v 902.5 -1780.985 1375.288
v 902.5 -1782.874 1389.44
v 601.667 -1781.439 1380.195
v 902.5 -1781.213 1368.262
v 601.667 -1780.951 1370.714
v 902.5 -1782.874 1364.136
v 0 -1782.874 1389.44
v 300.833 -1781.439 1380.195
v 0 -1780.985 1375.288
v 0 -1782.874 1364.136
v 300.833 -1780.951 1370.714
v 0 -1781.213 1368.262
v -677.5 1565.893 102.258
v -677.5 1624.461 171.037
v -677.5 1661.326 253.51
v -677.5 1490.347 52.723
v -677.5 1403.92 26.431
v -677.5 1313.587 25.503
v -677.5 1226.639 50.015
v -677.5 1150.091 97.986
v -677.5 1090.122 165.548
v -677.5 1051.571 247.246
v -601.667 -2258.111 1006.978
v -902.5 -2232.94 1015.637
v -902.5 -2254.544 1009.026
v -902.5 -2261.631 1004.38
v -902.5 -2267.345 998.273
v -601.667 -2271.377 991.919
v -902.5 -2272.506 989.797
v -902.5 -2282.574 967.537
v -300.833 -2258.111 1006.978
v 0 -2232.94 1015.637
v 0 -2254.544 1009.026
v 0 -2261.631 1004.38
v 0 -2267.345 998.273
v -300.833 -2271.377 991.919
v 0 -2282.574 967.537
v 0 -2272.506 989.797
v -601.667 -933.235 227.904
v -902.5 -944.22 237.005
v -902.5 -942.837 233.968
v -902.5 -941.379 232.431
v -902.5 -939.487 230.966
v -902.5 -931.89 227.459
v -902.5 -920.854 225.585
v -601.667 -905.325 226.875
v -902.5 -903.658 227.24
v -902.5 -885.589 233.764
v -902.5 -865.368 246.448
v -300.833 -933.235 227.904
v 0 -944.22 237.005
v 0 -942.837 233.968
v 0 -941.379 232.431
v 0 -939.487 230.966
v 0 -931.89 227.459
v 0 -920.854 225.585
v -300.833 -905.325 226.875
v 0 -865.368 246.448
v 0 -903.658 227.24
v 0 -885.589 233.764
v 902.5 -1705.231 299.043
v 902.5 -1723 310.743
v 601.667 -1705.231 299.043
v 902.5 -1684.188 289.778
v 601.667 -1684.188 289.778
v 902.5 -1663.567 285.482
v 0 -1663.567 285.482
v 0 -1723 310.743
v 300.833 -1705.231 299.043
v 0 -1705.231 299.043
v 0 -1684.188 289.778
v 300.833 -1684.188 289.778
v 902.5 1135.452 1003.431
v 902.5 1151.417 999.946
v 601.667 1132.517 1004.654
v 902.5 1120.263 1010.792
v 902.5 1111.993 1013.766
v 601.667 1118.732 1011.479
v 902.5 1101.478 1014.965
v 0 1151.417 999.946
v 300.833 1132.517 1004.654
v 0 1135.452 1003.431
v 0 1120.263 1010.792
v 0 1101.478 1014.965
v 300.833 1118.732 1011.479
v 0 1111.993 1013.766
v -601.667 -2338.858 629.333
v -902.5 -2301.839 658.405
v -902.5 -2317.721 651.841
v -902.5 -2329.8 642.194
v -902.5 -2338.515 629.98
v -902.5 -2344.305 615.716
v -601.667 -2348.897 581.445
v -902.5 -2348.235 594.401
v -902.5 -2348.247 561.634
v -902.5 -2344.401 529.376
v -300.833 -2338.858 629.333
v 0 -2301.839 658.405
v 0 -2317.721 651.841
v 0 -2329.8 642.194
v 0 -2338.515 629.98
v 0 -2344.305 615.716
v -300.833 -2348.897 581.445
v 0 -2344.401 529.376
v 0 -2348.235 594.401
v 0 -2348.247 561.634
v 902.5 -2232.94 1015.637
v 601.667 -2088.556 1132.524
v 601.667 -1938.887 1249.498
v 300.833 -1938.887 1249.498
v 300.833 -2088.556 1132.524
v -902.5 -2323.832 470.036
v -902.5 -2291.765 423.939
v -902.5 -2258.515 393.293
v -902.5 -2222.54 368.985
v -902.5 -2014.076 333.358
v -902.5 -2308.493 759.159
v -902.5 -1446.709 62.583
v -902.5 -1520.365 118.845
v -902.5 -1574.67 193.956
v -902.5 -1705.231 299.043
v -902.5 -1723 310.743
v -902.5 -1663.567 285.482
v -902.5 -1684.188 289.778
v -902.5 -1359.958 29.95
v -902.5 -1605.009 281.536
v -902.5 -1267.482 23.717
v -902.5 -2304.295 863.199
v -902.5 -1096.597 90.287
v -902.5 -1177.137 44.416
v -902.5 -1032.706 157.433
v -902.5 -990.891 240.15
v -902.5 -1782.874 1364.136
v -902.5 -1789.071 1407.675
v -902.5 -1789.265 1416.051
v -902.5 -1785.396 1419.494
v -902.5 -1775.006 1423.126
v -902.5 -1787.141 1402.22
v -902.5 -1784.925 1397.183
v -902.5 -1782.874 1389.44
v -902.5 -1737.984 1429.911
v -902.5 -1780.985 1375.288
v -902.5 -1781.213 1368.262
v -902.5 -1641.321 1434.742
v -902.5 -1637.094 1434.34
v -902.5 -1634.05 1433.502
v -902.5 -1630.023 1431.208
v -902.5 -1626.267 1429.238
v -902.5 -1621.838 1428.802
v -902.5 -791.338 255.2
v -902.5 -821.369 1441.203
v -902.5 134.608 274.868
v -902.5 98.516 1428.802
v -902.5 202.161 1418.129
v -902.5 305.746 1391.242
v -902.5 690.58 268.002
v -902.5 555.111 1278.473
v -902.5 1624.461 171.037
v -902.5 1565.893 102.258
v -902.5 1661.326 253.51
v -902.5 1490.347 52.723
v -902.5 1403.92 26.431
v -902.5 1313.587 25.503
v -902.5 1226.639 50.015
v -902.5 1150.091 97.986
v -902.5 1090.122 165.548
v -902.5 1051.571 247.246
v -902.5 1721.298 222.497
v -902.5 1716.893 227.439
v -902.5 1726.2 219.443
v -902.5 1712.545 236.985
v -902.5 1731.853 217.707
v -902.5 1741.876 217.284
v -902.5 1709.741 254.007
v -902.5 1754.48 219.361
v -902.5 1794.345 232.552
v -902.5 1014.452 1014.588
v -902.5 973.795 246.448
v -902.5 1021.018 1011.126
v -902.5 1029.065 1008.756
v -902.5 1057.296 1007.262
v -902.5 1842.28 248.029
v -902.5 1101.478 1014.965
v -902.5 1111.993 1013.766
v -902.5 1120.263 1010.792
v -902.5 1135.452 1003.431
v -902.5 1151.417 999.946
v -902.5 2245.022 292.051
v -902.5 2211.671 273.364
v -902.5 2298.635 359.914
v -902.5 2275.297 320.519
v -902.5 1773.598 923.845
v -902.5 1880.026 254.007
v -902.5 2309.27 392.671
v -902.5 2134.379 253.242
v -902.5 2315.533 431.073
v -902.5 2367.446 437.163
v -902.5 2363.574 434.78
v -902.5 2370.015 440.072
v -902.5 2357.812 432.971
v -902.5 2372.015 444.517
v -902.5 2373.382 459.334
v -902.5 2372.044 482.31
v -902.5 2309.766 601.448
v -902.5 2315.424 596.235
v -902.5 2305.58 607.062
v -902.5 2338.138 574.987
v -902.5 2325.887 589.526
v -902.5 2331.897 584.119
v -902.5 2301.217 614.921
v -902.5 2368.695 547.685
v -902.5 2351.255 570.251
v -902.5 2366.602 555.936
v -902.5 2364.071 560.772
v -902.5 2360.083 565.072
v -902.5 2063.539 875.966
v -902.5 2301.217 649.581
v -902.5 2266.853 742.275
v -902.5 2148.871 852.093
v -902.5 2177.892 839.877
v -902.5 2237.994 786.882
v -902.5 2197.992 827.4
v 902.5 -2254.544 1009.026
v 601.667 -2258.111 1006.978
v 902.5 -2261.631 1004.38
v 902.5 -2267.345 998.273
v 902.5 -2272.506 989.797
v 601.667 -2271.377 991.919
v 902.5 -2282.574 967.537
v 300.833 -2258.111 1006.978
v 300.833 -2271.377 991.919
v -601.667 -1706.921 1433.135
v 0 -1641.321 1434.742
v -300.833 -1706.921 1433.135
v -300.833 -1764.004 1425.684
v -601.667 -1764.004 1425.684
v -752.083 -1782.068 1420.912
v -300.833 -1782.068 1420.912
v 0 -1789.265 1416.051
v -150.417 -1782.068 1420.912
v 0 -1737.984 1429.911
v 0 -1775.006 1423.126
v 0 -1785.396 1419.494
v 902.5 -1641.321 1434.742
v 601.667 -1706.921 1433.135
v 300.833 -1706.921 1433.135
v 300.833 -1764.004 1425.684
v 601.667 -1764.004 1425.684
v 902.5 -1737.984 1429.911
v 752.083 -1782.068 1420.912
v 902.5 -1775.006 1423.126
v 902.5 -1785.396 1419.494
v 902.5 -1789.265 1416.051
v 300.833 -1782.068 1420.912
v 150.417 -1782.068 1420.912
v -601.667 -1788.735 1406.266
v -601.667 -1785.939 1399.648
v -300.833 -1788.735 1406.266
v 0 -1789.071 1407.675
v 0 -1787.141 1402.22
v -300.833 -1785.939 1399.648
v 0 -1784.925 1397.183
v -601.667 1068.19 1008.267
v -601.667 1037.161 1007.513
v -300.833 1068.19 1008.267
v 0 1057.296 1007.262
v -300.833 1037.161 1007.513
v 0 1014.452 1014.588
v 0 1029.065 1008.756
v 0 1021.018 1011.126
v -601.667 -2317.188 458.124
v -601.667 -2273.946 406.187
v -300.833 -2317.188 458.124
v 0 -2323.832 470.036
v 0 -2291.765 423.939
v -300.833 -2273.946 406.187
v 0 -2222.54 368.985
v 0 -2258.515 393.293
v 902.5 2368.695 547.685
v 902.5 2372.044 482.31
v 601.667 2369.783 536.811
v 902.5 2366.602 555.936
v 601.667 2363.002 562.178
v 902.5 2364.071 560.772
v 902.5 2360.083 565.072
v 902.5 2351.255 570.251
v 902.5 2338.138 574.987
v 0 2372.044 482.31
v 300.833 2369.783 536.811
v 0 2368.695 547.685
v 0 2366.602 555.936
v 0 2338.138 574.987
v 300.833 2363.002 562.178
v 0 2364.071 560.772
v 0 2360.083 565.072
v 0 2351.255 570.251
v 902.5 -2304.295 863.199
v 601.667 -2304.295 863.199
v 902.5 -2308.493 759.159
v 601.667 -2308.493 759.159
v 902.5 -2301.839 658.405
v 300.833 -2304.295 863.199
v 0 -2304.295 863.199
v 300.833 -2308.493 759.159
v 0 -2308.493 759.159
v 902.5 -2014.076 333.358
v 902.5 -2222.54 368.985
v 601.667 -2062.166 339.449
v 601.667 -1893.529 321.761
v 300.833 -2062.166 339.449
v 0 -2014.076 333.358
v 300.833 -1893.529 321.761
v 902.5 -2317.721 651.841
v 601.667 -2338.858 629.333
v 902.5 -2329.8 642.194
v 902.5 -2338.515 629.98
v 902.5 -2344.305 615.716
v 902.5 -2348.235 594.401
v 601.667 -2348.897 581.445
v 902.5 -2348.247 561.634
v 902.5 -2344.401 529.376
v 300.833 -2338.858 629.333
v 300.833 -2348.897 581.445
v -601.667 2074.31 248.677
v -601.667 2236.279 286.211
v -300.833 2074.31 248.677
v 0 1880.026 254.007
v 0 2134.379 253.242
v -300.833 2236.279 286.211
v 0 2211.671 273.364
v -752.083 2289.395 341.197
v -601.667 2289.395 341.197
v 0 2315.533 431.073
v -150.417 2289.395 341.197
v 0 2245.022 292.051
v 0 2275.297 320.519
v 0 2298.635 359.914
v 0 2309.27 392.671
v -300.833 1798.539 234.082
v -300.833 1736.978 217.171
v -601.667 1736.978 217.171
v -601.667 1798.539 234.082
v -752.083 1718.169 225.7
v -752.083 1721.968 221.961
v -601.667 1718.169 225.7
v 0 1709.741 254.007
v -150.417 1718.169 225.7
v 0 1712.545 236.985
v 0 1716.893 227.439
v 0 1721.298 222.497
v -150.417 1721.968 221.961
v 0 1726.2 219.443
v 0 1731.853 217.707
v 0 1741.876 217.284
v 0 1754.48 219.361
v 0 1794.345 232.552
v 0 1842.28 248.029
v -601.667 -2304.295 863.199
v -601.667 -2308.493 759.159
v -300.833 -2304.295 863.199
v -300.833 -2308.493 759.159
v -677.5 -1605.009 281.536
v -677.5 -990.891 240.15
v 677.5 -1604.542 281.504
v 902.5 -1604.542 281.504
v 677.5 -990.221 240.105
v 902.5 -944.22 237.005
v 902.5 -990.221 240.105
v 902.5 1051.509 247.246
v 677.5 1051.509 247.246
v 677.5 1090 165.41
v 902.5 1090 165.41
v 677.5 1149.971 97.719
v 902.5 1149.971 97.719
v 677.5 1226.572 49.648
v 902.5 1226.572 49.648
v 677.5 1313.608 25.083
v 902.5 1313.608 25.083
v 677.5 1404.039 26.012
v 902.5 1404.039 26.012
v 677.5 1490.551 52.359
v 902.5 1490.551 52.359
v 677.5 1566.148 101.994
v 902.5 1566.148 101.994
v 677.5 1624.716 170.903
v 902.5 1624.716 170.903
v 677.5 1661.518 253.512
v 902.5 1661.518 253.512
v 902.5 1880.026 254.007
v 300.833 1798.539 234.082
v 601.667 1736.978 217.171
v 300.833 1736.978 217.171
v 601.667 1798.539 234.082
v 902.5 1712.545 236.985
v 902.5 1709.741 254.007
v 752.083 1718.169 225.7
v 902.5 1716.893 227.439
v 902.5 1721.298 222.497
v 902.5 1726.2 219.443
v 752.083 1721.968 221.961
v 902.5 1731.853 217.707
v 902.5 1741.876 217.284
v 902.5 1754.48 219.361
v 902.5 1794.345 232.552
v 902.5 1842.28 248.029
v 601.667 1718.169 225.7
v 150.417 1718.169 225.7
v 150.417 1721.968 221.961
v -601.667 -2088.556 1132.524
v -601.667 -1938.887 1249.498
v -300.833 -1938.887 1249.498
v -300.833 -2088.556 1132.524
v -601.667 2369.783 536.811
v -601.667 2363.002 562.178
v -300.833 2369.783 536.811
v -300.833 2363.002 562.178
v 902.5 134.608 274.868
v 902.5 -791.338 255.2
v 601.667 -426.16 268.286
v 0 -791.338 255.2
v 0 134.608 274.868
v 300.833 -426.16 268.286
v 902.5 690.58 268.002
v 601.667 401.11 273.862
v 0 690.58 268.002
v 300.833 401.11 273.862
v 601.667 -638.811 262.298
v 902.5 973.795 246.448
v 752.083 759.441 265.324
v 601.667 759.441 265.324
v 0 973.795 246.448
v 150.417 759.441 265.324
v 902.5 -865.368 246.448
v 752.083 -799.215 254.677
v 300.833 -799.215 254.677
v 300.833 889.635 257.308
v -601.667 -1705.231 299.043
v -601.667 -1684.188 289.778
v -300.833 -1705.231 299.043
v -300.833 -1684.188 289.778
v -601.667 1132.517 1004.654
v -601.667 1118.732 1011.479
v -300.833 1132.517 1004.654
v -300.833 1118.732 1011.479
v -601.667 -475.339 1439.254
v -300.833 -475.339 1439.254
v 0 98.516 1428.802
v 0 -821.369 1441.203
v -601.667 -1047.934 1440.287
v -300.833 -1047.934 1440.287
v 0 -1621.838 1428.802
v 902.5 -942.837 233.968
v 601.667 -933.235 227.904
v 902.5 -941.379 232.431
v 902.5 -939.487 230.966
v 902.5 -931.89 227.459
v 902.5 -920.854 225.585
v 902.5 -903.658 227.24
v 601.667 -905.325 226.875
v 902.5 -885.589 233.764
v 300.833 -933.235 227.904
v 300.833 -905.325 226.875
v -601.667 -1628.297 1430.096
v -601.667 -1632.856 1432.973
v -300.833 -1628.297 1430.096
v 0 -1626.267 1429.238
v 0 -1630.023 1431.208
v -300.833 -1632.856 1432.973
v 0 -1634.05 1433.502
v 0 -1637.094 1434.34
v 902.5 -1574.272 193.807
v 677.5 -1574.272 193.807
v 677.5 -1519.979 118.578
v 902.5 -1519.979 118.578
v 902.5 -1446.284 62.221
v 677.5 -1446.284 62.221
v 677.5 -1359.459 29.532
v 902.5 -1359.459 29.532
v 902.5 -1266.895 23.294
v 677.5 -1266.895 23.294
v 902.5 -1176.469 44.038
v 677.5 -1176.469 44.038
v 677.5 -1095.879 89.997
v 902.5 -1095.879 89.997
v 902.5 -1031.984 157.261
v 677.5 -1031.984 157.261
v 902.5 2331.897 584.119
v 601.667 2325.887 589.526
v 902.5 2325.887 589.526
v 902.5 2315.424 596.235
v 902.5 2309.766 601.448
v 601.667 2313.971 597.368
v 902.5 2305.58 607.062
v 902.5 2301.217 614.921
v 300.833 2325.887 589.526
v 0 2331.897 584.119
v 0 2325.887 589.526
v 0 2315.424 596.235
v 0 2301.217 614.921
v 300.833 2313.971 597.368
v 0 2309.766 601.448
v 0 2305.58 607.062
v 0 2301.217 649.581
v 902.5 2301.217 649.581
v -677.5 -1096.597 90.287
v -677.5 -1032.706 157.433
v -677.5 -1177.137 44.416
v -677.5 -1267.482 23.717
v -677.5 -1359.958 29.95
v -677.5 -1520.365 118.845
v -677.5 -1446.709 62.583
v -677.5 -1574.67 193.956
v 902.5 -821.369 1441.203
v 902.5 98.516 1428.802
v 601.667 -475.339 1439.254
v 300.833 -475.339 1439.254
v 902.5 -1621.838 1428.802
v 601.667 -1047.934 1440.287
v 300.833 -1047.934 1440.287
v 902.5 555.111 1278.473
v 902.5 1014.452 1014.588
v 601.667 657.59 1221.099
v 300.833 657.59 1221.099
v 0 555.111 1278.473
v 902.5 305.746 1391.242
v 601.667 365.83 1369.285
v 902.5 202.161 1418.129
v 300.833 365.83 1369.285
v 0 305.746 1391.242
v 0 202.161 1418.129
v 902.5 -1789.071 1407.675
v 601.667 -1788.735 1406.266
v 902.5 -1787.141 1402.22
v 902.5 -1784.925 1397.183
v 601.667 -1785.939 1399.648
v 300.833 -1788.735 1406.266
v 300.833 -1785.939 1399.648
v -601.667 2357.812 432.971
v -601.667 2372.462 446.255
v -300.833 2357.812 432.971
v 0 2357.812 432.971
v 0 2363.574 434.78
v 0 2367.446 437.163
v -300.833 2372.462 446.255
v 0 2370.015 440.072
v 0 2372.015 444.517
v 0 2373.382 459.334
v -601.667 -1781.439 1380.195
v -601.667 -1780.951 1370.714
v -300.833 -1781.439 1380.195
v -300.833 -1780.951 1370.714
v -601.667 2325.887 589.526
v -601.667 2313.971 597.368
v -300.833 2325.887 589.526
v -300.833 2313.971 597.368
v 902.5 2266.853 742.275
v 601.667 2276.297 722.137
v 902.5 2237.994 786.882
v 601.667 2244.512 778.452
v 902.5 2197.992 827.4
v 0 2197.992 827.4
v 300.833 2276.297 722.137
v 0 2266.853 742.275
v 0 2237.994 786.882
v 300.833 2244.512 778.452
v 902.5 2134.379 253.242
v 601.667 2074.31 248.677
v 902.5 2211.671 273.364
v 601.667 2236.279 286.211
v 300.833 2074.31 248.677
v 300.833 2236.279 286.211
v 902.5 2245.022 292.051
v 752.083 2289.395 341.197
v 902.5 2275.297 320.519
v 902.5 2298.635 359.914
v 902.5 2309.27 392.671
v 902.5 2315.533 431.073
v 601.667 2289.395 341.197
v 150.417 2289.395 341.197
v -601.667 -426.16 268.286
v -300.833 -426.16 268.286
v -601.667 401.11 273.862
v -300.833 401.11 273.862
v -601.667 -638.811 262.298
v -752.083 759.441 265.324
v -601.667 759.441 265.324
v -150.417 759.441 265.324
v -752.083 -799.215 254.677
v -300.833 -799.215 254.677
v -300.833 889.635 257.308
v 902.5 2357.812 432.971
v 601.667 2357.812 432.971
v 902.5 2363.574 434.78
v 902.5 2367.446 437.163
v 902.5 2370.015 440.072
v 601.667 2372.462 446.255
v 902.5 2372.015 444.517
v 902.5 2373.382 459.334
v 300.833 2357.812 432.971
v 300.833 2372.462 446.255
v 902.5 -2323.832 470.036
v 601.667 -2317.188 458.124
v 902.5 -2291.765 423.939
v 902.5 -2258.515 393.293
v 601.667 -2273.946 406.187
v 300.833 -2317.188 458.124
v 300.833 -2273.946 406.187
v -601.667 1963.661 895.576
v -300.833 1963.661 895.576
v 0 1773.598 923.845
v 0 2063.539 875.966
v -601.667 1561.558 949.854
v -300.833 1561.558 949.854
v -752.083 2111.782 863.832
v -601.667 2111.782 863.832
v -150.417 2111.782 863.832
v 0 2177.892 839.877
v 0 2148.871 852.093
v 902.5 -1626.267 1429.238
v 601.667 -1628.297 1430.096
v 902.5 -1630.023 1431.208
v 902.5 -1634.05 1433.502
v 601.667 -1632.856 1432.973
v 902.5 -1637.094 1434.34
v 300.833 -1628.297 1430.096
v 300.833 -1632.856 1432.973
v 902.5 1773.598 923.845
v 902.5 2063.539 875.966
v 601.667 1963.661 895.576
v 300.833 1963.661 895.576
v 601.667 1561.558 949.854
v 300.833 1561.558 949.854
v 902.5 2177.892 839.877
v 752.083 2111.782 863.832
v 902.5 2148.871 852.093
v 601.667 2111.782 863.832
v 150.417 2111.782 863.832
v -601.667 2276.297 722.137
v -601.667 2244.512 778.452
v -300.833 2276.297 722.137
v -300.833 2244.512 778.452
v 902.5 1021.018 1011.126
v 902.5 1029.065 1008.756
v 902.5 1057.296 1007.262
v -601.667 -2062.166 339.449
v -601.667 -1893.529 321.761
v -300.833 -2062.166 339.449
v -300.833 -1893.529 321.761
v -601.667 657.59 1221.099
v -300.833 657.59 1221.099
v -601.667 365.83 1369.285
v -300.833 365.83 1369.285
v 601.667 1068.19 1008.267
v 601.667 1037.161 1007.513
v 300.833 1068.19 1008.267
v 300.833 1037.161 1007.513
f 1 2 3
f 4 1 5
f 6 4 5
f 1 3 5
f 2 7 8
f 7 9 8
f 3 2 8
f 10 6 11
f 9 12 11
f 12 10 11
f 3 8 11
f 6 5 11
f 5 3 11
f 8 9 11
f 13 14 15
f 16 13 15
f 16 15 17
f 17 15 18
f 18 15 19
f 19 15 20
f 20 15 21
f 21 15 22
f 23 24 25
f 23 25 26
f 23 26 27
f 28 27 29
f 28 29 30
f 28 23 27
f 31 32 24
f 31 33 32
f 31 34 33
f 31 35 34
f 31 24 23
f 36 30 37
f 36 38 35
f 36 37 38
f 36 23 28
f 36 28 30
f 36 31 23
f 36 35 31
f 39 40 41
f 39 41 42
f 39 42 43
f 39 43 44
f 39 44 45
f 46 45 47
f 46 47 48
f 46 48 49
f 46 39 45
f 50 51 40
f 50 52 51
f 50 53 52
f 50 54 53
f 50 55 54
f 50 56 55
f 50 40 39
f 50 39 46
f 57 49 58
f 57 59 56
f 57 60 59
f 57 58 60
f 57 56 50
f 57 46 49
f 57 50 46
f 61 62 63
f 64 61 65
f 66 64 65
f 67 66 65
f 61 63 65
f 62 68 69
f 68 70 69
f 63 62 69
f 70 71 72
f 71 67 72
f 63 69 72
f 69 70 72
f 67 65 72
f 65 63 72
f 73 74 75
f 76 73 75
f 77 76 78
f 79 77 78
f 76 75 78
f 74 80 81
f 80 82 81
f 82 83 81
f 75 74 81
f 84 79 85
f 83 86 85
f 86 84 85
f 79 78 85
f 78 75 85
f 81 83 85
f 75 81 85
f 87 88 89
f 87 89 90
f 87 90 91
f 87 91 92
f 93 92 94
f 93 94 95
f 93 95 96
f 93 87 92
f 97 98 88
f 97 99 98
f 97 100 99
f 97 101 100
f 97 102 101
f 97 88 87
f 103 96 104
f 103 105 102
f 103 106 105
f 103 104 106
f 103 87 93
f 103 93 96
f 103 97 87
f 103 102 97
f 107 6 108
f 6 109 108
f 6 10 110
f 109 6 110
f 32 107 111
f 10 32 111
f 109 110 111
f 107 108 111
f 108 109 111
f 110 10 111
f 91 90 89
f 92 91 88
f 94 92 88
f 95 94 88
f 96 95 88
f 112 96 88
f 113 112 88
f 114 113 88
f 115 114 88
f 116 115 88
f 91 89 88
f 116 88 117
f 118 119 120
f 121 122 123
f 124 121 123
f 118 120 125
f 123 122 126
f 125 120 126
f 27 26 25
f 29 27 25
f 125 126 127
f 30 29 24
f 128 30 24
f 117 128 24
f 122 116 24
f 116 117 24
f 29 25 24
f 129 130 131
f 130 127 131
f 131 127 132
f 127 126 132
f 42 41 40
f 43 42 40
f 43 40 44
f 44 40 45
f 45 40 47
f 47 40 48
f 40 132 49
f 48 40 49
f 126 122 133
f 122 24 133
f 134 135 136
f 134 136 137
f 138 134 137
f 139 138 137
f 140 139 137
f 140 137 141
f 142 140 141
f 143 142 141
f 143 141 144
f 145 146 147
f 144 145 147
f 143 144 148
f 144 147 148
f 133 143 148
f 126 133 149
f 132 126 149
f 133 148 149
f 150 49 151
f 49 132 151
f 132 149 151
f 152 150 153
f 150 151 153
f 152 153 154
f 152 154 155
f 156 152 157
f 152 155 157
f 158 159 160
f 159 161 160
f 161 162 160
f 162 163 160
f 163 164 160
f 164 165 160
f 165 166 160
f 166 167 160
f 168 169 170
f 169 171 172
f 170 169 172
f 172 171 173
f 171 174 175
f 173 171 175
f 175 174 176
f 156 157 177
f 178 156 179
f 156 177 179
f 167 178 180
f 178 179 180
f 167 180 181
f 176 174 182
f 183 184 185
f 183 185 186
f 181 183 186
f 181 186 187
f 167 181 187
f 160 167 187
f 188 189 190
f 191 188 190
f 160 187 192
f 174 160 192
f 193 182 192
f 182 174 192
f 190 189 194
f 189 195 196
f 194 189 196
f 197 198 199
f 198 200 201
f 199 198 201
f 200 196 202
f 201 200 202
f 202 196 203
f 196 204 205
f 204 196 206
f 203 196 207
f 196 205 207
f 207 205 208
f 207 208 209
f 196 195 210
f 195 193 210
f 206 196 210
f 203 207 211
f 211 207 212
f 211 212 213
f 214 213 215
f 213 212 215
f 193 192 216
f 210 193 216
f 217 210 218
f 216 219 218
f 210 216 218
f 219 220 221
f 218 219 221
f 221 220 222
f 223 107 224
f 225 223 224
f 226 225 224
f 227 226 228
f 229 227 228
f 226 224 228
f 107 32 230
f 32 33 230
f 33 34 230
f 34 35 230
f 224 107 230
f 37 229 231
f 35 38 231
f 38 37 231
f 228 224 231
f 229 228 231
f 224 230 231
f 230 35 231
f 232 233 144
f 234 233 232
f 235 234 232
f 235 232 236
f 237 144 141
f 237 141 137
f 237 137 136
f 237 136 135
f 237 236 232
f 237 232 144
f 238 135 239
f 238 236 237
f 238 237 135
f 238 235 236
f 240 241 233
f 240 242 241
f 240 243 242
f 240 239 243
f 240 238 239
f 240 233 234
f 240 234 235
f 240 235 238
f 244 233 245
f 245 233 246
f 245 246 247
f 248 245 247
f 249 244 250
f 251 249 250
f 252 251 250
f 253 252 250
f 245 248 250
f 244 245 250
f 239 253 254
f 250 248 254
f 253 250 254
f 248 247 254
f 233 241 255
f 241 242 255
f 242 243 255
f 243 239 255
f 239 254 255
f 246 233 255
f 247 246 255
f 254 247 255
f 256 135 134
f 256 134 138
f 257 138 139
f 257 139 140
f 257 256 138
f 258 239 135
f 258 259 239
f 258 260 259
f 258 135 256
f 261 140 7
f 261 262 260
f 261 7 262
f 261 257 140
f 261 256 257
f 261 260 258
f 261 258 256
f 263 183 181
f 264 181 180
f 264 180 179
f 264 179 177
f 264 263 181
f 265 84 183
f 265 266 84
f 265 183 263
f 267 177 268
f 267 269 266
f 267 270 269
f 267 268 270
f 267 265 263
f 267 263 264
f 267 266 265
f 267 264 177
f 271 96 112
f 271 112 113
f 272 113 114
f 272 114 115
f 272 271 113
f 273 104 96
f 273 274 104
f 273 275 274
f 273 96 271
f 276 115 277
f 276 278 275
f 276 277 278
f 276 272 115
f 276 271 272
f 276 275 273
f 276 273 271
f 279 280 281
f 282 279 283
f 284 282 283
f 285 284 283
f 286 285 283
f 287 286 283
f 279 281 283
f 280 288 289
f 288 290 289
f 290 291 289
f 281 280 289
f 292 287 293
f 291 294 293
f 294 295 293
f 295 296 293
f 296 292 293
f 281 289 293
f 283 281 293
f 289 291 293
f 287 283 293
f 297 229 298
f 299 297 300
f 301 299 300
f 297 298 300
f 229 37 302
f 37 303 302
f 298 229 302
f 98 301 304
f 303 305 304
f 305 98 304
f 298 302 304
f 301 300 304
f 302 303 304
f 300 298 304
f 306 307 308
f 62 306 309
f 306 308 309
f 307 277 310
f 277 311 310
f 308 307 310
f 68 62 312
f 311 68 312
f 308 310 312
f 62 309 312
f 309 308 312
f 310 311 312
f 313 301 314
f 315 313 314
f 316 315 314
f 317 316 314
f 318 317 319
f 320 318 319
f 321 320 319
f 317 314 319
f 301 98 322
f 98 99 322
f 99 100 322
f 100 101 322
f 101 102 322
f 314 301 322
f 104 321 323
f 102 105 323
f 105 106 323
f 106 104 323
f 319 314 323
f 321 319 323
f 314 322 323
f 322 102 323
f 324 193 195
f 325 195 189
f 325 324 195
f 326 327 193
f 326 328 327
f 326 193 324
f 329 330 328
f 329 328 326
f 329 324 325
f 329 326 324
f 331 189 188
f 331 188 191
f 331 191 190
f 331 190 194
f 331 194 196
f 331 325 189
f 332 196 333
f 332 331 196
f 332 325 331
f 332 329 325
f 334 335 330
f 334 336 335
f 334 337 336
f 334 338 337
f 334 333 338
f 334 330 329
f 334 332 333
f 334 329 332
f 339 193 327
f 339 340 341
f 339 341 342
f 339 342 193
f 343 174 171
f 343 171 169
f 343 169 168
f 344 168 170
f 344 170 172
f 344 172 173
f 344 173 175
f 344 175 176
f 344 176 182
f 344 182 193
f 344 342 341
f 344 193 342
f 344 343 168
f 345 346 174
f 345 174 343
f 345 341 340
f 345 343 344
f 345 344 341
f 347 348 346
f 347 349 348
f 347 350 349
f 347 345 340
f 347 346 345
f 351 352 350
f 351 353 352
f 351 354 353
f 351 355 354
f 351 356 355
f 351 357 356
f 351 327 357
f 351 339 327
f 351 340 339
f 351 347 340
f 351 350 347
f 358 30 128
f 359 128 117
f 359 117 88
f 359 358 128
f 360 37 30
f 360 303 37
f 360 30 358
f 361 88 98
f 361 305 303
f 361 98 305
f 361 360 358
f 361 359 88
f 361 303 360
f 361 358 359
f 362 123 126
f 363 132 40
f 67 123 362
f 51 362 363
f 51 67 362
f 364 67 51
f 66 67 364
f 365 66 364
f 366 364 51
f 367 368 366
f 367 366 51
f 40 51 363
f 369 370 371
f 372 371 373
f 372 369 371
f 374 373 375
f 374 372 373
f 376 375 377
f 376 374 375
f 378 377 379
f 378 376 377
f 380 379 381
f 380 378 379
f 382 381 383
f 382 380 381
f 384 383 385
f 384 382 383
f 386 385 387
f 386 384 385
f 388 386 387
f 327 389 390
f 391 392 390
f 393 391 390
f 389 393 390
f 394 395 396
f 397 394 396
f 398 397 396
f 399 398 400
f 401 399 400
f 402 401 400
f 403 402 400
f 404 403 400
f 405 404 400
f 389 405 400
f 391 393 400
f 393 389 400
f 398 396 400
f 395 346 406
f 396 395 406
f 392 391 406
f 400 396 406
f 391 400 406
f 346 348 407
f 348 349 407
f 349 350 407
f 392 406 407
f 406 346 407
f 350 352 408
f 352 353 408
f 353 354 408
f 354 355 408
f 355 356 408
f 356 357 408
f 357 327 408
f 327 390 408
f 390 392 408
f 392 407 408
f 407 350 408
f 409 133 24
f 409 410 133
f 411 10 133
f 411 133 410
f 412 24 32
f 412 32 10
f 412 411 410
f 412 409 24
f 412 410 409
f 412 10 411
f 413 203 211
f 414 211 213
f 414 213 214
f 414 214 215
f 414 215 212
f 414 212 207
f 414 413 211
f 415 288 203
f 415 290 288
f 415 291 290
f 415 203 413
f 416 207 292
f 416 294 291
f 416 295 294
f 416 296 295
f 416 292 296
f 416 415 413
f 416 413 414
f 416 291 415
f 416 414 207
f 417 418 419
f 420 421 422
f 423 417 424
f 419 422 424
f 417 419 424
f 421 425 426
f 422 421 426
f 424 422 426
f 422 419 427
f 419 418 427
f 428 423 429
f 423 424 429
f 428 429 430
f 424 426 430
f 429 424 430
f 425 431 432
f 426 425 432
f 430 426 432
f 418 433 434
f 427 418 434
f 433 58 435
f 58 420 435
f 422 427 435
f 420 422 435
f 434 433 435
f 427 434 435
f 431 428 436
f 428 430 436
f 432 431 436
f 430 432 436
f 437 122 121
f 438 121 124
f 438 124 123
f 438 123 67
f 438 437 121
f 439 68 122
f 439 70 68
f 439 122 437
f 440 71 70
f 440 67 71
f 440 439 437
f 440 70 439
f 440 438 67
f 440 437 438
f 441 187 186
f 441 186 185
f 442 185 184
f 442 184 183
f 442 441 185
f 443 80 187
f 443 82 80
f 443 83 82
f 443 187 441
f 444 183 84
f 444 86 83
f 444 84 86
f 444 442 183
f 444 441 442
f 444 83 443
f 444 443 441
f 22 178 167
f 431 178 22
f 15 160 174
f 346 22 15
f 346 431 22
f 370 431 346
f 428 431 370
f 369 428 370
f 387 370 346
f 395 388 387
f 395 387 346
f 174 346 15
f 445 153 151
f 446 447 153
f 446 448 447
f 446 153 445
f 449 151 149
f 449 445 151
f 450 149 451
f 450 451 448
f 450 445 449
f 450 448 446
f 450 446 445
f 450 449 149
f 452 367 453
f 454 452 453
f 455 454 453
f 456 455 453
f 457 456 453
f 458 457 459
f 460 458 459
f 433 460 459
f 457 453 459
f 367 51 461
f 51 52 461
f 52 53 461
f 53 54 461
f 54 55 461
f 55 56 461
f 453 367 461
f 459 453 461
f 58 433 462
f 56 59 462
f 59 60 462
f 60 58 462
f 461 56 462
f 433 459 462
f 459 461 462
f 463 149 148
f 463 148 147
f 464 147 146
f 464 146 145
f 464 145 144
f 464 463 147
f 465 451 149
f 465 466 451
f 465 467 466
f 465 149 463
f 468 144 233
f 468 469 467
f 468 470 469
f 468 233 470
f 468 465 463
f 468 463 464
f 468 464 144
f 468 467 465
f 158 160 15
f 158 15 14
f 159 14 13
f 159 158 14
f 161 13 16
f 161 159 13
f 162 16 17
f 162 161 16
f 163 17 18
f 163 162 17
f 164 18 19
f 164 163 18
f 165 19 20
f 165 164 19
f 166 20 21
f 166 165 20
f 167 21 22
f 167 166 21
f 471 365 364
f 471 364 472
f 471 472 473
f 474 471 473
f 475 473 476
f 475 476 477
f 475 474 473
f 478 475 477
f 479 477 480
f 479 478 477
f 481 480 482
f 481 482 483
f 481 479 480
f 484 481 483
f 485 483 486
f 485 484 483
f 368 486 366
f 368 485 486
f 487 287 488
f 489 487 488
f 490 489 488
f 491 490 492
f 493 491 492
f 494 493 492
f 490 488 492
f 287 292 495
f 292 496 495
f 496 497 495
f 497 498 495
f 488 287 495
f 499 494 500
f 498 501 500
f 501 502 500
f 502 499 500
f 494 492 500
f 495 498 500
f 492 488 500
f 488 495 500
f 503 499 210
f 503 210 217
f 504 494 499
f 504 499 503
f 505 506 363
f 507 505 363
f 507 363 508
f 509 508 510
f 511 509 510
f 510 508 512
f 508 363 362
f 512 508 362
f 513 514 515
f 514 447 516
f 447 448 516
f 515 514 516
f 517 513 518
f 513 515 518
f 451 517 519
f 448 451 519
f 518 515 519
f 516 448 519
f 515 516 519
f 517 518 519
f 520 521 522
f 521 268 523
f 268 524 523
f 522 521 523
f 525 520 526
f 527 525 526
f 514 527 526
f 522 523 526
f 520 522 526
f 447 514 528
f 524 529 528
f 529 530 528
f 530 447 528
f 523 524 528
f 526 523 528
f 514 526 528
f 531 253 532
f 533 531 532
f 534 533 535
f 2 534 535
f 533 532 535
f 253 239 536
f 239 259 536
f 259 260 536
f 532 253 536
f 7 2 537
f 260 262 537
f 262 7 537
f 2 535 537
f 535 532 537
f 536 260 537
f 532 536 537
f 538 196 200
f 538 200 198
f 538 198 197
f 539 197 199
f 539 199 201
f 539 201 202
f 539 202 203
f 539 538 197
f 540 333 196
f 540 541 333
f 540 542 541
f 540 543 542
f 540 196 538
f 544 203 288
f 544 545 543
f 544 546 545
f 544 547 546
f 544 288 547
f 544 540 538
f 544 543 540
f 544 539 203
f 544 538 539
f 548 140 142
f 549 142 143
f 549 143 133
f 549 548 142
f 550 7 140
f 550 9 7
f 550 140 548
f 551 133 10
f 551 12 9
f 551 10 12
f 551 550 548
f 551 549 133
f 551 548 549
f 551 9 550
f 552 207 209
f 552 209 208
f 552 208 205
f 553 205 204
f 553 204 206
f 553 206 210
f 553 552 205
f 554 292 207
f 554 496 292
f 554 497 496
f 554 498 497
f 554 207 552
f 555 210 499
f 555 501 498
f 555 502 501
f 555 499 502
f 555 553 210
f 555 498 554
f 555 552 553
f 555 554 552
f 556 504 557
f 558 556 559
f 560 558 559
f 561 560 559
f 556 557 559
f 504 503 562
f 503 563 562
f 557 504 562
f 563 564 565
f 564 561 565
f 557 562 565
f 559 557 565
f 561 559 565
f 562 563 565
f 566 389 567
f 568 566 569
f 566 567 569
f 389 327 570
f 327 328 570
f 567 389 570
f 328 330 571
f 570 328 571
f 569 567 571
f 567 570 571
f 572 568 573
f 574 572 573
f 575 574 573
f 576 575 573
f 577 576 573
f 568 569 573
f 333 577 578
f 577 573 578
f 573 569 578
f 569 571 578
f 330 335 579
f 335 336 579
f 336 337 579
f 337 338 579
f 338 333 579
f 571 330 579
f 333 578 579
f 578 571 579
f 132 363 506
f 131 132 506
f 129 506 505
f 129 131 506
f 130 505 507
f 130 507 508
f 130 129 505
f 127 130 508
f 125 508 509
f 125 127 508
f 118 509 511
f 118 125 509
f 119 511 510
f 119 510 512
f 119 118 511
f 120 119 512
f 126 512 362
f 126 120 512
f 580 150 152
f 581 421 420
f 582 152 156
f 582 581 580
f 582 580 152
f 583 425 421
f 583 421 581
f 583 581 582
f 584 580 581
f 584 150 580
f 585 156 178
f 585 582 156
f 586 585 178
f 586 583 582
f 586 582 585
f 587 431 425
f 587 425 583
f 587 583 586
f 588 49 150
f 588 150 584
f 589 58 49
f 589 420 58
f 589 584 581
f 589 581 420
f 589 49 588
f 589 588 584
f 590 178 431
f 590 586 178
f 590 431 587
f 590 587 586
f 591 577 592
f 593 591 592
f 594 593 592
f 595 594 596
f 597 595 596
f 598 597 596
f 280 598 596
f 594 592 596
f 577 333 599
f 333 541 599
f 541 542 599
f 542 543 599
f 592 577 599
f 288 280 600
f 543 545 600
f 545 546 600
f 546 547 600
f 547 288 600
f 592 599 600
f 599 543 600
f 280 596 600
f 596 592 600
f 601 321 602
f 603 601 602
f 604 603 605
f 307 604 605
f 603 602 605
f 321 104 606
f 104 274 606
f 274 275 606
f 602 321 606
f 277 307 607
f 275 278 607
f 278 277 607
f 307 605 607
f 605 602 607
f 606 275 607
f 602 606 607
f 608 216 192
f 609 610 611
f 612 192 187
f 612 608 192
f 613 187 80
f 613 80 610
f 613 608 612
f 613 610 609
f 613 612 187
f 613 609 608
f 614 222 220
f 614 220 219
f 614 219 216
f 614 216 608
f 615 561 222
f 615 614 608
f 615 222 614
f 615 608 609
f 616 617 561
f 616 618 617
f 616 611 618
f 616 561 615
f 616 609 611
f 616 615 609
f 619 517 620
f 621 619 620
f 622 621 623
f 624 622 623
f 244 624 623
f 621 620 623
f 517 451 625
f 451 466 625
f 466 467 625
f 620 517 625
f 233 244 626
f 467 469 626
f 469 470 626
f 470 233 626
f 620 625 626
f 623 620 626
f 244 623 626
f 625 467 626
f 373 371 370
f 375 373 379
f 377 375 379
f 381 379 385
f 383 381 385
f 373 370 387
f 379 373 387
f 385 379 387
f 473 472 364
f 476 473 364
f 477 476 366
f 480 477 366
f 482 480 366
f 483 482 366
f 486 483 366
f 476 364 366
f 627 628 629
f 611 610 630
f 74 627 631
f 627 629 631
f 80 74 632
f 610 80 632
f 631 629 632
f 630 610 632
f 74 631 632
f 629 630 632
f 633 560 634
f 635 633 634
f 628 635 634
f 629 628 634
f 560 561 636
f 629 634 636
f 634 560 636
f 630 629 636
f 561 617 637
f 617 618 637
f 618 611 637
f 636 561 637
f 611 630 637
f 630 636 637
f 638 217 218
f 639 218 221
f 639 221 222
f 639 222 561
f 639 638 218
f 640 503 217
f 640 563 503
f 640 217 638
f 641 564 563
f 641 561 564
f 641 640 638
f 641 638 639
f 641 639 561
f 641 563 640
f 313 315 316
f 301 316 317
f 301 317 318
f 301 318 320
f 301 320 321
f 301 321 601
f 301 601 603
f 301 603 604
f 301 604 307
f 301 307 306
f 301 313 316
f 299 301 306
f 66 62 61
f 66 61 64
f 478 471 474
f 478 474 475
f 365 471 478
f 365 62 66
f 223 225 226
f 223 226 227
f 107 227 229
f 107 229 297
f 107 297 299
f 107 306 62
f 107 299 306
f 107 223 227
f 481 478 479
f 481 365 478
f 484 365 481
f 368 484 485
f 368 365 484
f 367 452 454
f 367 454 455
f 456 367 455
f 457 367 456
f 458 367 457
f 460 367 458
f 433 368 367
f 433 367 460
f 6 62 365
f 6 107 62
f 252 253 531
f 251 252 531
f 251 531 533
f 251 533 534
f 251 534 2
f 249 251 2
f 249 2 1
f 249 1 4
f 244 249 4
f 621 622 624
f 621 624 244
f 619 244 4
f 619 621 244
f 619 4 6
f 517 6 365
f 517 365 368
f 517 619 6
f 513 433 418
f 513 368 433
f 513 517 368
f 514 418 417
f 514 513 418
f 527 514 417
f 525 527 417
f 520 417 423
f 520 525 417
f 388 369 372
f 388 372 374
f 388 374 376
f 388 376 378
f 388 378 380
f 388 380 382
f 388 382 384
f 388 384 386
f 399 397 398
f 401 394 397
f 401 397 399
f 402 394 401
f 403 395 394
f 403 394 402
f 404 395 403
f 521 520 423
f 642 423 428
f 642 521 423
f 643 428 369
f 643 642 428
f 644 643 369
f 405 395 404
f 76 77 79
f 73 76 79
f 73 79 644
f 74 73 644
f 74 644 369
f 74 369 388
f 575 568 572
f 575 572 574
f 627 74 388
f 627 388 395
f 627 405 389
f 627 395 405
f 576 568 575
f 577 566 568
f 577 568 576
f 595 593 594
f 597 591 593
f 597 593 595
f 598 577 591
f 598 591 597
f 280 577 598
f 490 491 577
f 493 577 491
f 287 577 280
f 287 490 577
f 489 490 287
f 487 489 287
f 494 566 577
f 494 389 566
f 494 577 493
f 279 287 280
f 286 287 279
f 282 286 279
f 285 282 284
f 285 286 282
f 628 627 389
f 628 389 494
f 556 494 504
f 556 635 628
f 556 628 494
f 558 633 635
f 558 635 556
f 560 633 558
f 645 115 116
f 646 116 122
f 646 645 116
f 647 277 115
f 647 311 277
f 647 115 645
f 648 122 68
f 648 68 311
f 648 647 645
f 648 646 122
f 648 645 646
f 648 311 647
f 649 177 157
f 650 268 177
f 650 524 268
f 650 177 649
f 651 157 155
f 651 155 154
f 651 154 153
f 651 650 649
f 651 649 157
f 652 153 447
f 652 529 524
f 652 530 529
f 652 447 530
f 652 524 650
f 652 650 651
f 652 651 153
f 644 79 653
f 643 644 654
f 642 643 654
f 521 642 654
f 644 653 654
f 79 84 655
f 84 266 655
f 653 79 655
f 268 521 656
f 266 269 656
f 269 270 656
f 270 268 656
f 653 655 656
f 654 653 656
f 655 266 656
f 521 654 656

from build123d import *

# Parameters (mm, degrees)
F1_DEPTH = 902.5
F3_DEPTH = 225
F5_DEPTH = 225


with BuildPart() as f1:
    # F0 (on Right) → F1 (new body, symmetric)
    with BuildSketch(Plane.YZ):
        with BuildLine():
            add(Edge.make_bspline(
                [(1101.478338, 1014.964938), (1069.079041, 1005.923271), (1030.981779, 1002.969623), (1014.452219, 1014.588237)],
                knots=[0, 0, 0, 0, 87.026935, 87.026935, 87.026935, 87.026935], degree=3))
            add(Edge.make_bspline(
                [(1014.452219, 1014.588237), (611.487091, 1240.147233), (367.158981, 1423.733741), (98.51558, 1428.802401)],
                knots=[0, 0, 0, 0, 1005.242907, 1005.242907, 1005.242907, 1005.242907], degree=3))
            add(Edge.make_bspline(
                [(98.51558, 1428.802401), (-476.824492, 1442.931395), (-1046.424493, 1447.578598), (-1621.837849, 1428.802401)],
                knots=[0, 0, 0, 0, 1720.353428, 1720.353428, 1720.353428, 1720.353428], degree=3))
            add(Edge.make_bspline(
                [(-1621.837849, 1428.802401), (-1631.183743, 1428.406358), (-1628.966093, 1434.425473), (-1641.321182, 1434.742212)],
                knots=[0, 0, 0, 0, 20.368644, 20.368644, 20.368644, 20.368644], degree=3))
            add(Edge.make_bspline(
                [(-1641.321182, 1434.742212), (-1703.413248, 1437.276602), (-1787.681103, 1425.555229), (-1789.265156, 1416.051269)],
                knots=[0, 0, 0, 0, 149.119988, 149.119988, 149.119988, 149.119988], degree=3))
            add(Edge.make_bspline(
                [(-1789.265156, 1416.051269), (-1790.532351, 1402.428985), (-1785.408854, 1403.696299), (-1782.874465, 1389.440417)],
                knots=[0, 0, 0, 0, 27.367469, 27.367469, 27.367469, 27.367469], degree=3))
            add(Edge.make_bspline(
                [(-1782.874465, 1389.440417), (-1781.454563, 1381.36065), (-1779.255867, 1368.214488), (-1782.874465, 1364.135981)],
                knots=[0, 0, 0, 0, 25.304437, 25.304437, 25.304437, 25.304437], degree=3))
            add(Edge.make_bspline(
                [(-1782.874465, 1364.135981), (-1942.411184, 1251.474142), (-2090.845346, 1131.671906), (-2232.93972, 1015.63704)],
                knots=[0, 0, 0, 0, 569.218978, 569.218978, 569.218978, 569.218978], degree=3))
            add(Edge.make_bspline(
                [(-2232.93972, 1015.63704), (-2267.341375, 1009.202838), (-2269.133568, 997.554421), (-2282.573938, 967.537224)],
                knots=[0, 0, 0, 0, 69.116915, 69.116915, 69.116915, 69.116915], degree=3))
            add(Edge.make_bspline(
                [(-2282.573938, 967.537224), (-2315.279484, 864.045084), (-2311.695337, 756.520808), (-2301.838875, 658.404887)],
                knots=[0, 0, 0, 0, 309.732045, 309.732045, 309.732045, 309.732045], degree=3))
            add(Edge.make_bspline(
                [(-2301.838875, 658.404887), (-2356.497049, 643.620253), (-2352.016926, 578.657687), (-2344.400644, 529.375732)],
                knots=[0, 0, 0, 0, 135.867682, 135.867682, 135.867682, 135.867682], degree=3))
            add(Edge.make_bspline(
                [(-2344.400644, 529.375732), (-2327.823877, 446.940452), (-2275.405645, 400.346547), (-2222.539663, 368.985325)],
                knots=[0, 0, 0, 0, 201.432821, 201.432821, 201.432821, 201.432821], degree=3))
            add(Edge.make_bspline(
                [(-2222.539663, 368.985325), (-2068.421602, 331.799835), (-1892.350554, 320.151389), (-1722.999811, 310.743004)],
                knots=[0, 0, 0, 0, 502.923684, 502.923684, 502.923684, 502.923684], degree=3))
            add(Edge.make_bspline(
                [(-1722.999811, 310.743004), (-1708.100813, 298.669668), (-1682.744431, 286.449044), (-1663.56729, 285.481846)],
                knots=[0, 0, 0, 0, 48.861796, 48.861796, 48.861796, 48.861796], degree=3))
            add(Edge.make_bspline(
                [(-1663.56729, 285.481846), (-1649.298017, 284.762176), (-1638.449888, 290.272975), (-1637.876511, 306.710869)],
                knots=[48.861796, 48.861796, 48.861796, 48.861796, 85.218744, 85.218744, 85.218744, 85.218744], degree=3))
            add(Edge.make_bspline(
                [(-1637.876511, 306.710869), (-1649.076819, 526.687622), (-1542.44864, 647.204399), (-1412.971497, 702.75861)],
                knots=[0, 0, 0, 0, 455.451511, 455.451511, 455.451511, 455.451511], degree=3))
            add(Edge.make_bspline(
                [(-1412.971497, 702.75861), (-1258.853316, 737.704039), (-1082.334399, 719.783306), (-989.14665, 553.568661)],
                knots=[0, 0, 0, 0, 449.316305, 449.316305, 449.316305, 449.316305], degree=3))
            add(Edge.make_bspline(
                [(-989.14665, 553.568661), (-936.602473, 454.77581), (-941.532441, 342.288904), (-944.220491, 237.004705)],
                knots=[0, 0, 0, 0, 319.735982, 319.735982, 319.735982, 319.735982], degree=3))
            add(Edge.make_bspline(
                [(-944.220491, 237.004705), (-943.324455, 228.044353), (-909.721375, 212.398157), (-865.367591, 246.447518)],
                knots=[0, 0, 0, 0, 79.416286, 79.416286, 79.416286, 79.416286], degree=3))
            add(Edge.make_bspline(
                [(-865.367591, 246.447518), (-834.405482, 270.842612), (742.617369, 295.931607), (973.79452, 246.447518)],
                knots=[0, 0, 0, 0, 1839.162111, 1839.162111, 1839.162111, 1839.162111], degree=3))
            add(Edge.make_bspline(
                [(973.79452, 246.447518), (982.639194, 467.240185), (1032.368422, 711.365521), (1331.497312, 736.230135)],
                knots=[0, 0, 0, 0, 606.496742, 606.496742, 606.496742, 606.496742], degree=3))
            add(Edge.make_bspline(
                [(1331.497312, 736.230135), (1562.060118, 742.257893), (1739.879847, 544.094384), (1709.740877, 254.00722)],
                knots=[0, 0, 0, 0, 612.867958, 612.867958, 612.867958, 612.867958], degree=3))
            add(Edge.make_bspline(
                [(1709.740877, 254.00722), (1715.015173, 173.385605), (1793.376446, 249.486387), (1880.025864, 254.00722)],
                knots=[0, 0, 0, 0, 170.284986, 170.284986, 170.284986, 170.284986], degree=3))
            add(Edge.make_bspline(
                [(1880.025864, 254.00722), (2073.66848, 248.73291), (2294.435978, 211.059242), (2315.5334, 431.073427)],
                knots=[0, 0, 0, 0, 470.12685, 470.12685, 470.12685, 470.12685], degree=3))
            add(Edge.make_bspline(
                [(2315.5334, 431.073427), (2375.8111, 431.073457), (2375.8111, 431.073457), (2372.043848, 482.30961)],
                knots=[0, 0, 0, 0, 76.279599, 76.279599, 76.279599, 76.279599], degree=3))
            add(Edge.make_bspline(
                [(2372.043848, 482.30961), (2367.522955, 556.903422), (2376.564741, 562.93124), (2338.137627, 574.986815)],
                knots=[0, 0, 0, 0, 98.684833, 98.684833, 98.684833, 98.684833], degree=3))
            add(Edge.make_bspline(
                [(2338.137627, 574.986815), (2325.328588, 598.344445), (2314.779997, 587.042391), (2301.217318, 614.920855)],
                knots=[0, 0, 0, 0, 54.385997, 54.385997, 54.385997, 54.385997], degree=3))
            add(Edge.make_bspline(
                [(2301.217318, 614.920855), (2301.217318, 626.474122), (2301.217318, 638.02739), (2301.217318, 649.580657)],
                knots=[0, 0, 0, 0, 34.659803, 34.659803, 34.659803, 34.659803], degree=3))
            add(Edge.make_bspline(
                [(2301.217318, 649.580657), (2277.106285, 733.216166), (2254.502296, 779.178023), (2197.99161, 827.400327)],
                knots=[0, 0, 0, 0, 205.60978, 205.60978, 205.60978, 205.60978], degree=3))
            add(Edge.make_bspline(
                [(2197.99161, 827.400327), (2100.7936, 905.76154), (1512.33089, 948.709548), (1151.417255, 999.9457)],
                knots=[0, 0, 0, 0, 1060.702496, 1060.702496, 1060.702496, 1060.702496], degree=3))
            add(Edge.make_bspline(
                [(1151.417255, 999.9457), (1127.096415, 1001.779199), (1123.329043, 1014.964938), (1101.478338, 1014.964938)],
                knots=[0, 0, 0, 0, 52.148566, 52.148566, 52.148566, 52.148566], degree=3))
        make_face()
        with BuildLine():
            Line((973.79452, 246.447518), (1709.740877, 254.00722))
            add(Edge.make_bspline(
                [(1331.497312, 736.230135), (1562.060118, 742.257893), (1739.879847, 544.094384), (1709.740877, 254.00722)],
                knots=[0, 0, 0, 0, 612.867958, 612.867958, 612.867958, 612.867958], degree=3))
            add(Edge.make_bspline(
                [(973.79452, 246.447518), (982.639194, 467.240185), (1032.368422, 711.365521), (1331.497312, 736.230135)],
                knots=[0, 0, 0, 0, 606.496742, 606.496742, 606.496742, 606.496742], degree=3))
        make_face()
        with BuildLine():
            add(Edge.make_bspline(
                [(-1663.56729, 285.481846), (-1649.298017, 284.762176), (-1638.449888, 290.272975), (-1637.876511, 306.710869)],
                knots=[48.861796, 48.861796, 48.861796, 48.861796, 85.218744, 85.218744, 85.218744, 85.218744], degree=3))
            Line((-1663.56729, 285.481846), (-944.220491, 237.004705))
            add(Edge.make_bspline(
                [(-989.14665, 553.568661), (-936.602473, 454.77581), (-941.532441, 342.288904), (-944.220491, 237.004705)],
                knots=[0, 0, 0, 0, 319.735982, 319.735982, 319.735982, 319.735982], degree=3))
            add(Edge.make_bspline(
                [(-1412.971497, 702.75861), (-1258.853316, 737.704039), (-1082.334399, 719.783306), (-989.14665, 553.568661)],
                knots=[0, 0, 0, 0, 449.316305, 449.316305, 449.316305, 449.316305], degree=3))
            add(Edge.make_bspline(
                [(-1637.876511, 306.710869), (-1649.076819, 526.687622), (-1542.44864, 647.204399), (-1412.971497, 702.75861)],
                knots=[0, 0, 0, 0, 455.451511, 455.451511, 455.451511, 455.451511], degree=3))
        make_face()
    extrude(amount=F1_DEPTH, both=True)

    # F2 (on face) → F3 (join)
    with BuildSketch(Plane(origin=(-902.5, 0, 0), x_dir=(0, -1, 0), z_dir=(-1, 0, 0))):
        with BuildLine():
            ThreePointArc((-1051.570597, 247.246441), (-1041.052542, 293.461517), (-1037.520368, 340.726584))
            ThreePointArc((-1037.520368, 340.726584), (-1399.552872, 655.663306), (-1661.326271, 253.509901))
            Line((-1661.326271, 253.509901), (-1051.570597, 247.246441))
        make_face()
        with BuildLine():
            Line((-1051.570597, 247.246441), (-1661.326271, 253.509901))
            ThreePointArc((-1661.326271, 253.509901), (-1358.786718, 22.74336), (-1051.570597, 247.246441))
        make_face()
        with BuildLine():
            ThreePointArc((1610.566419, 340.726584), (1241.61997, 654.619017), (990.890574, 240.149825))
            Line((990.890574, 240.149825), (1605.009093, 281.53558))
            ThreePointArc((1605.009093, 281.53558), (1609.174039, 311.000927), (1610.566419, 340.726584))
        make_face()
        with BuildLine():
            Line((1605.009093, 281.53558), (990.890574, 240.149825))
            ThreePointArc((990.890574, 240.149825), (1313.948101, 23.446229), (1605.009093, 281.53558))
        make_face()
    extrude(amount=-F3_DEPTH)

    # F4 (on face) → F5 (join)
    with BuildSketch(Plane.YZ.offset(902.5)):
        with BuildLine():
            ThreePointArc((-990.221178, 240.104714), (-978.09951, 289.551691), (-974.024136, 340.299398))
            ThreePointArc((-974.024136, 340.299398), (-1321.549336, 656.925775), (-1604.54151, 281.504069))
            Line((-1604.54151, 281.504069), (-990.221178, 240.104714))
        make_face()
        with BuildLine():
            Line((-990.221178, 240.104714), (-1604.54151, 281.504069))
            ThreePointArc((-1604.54151, 281.504069), (-1313.405818, 23.019043), (-990.221178, 240.104714))
        make_face()
        with BuildLine():
            ThreePointArc((1673.589986, 340.299398), (1308.545542, 654.800304), (1051.509355, 247.245812))
            Line((1051.509355, 247.245812), (1661.51796, 253.51187))
            ThreePointArc((1661.51796, 253.51187), (1670.55752, 296.487845), (1673.589986, 340.299398))
        make_face()
        with BuildLine():
            Line((1661.51796, 253.51187), (1051.509355, 247.245812))
            ThreePointArc((1051.509355, 247.245812), (1358.856336, 22.316173), (1661.51796, 253.51187))
        make_face()
    extrude(amount=-F5_DEPTH)


solid = f1.part
